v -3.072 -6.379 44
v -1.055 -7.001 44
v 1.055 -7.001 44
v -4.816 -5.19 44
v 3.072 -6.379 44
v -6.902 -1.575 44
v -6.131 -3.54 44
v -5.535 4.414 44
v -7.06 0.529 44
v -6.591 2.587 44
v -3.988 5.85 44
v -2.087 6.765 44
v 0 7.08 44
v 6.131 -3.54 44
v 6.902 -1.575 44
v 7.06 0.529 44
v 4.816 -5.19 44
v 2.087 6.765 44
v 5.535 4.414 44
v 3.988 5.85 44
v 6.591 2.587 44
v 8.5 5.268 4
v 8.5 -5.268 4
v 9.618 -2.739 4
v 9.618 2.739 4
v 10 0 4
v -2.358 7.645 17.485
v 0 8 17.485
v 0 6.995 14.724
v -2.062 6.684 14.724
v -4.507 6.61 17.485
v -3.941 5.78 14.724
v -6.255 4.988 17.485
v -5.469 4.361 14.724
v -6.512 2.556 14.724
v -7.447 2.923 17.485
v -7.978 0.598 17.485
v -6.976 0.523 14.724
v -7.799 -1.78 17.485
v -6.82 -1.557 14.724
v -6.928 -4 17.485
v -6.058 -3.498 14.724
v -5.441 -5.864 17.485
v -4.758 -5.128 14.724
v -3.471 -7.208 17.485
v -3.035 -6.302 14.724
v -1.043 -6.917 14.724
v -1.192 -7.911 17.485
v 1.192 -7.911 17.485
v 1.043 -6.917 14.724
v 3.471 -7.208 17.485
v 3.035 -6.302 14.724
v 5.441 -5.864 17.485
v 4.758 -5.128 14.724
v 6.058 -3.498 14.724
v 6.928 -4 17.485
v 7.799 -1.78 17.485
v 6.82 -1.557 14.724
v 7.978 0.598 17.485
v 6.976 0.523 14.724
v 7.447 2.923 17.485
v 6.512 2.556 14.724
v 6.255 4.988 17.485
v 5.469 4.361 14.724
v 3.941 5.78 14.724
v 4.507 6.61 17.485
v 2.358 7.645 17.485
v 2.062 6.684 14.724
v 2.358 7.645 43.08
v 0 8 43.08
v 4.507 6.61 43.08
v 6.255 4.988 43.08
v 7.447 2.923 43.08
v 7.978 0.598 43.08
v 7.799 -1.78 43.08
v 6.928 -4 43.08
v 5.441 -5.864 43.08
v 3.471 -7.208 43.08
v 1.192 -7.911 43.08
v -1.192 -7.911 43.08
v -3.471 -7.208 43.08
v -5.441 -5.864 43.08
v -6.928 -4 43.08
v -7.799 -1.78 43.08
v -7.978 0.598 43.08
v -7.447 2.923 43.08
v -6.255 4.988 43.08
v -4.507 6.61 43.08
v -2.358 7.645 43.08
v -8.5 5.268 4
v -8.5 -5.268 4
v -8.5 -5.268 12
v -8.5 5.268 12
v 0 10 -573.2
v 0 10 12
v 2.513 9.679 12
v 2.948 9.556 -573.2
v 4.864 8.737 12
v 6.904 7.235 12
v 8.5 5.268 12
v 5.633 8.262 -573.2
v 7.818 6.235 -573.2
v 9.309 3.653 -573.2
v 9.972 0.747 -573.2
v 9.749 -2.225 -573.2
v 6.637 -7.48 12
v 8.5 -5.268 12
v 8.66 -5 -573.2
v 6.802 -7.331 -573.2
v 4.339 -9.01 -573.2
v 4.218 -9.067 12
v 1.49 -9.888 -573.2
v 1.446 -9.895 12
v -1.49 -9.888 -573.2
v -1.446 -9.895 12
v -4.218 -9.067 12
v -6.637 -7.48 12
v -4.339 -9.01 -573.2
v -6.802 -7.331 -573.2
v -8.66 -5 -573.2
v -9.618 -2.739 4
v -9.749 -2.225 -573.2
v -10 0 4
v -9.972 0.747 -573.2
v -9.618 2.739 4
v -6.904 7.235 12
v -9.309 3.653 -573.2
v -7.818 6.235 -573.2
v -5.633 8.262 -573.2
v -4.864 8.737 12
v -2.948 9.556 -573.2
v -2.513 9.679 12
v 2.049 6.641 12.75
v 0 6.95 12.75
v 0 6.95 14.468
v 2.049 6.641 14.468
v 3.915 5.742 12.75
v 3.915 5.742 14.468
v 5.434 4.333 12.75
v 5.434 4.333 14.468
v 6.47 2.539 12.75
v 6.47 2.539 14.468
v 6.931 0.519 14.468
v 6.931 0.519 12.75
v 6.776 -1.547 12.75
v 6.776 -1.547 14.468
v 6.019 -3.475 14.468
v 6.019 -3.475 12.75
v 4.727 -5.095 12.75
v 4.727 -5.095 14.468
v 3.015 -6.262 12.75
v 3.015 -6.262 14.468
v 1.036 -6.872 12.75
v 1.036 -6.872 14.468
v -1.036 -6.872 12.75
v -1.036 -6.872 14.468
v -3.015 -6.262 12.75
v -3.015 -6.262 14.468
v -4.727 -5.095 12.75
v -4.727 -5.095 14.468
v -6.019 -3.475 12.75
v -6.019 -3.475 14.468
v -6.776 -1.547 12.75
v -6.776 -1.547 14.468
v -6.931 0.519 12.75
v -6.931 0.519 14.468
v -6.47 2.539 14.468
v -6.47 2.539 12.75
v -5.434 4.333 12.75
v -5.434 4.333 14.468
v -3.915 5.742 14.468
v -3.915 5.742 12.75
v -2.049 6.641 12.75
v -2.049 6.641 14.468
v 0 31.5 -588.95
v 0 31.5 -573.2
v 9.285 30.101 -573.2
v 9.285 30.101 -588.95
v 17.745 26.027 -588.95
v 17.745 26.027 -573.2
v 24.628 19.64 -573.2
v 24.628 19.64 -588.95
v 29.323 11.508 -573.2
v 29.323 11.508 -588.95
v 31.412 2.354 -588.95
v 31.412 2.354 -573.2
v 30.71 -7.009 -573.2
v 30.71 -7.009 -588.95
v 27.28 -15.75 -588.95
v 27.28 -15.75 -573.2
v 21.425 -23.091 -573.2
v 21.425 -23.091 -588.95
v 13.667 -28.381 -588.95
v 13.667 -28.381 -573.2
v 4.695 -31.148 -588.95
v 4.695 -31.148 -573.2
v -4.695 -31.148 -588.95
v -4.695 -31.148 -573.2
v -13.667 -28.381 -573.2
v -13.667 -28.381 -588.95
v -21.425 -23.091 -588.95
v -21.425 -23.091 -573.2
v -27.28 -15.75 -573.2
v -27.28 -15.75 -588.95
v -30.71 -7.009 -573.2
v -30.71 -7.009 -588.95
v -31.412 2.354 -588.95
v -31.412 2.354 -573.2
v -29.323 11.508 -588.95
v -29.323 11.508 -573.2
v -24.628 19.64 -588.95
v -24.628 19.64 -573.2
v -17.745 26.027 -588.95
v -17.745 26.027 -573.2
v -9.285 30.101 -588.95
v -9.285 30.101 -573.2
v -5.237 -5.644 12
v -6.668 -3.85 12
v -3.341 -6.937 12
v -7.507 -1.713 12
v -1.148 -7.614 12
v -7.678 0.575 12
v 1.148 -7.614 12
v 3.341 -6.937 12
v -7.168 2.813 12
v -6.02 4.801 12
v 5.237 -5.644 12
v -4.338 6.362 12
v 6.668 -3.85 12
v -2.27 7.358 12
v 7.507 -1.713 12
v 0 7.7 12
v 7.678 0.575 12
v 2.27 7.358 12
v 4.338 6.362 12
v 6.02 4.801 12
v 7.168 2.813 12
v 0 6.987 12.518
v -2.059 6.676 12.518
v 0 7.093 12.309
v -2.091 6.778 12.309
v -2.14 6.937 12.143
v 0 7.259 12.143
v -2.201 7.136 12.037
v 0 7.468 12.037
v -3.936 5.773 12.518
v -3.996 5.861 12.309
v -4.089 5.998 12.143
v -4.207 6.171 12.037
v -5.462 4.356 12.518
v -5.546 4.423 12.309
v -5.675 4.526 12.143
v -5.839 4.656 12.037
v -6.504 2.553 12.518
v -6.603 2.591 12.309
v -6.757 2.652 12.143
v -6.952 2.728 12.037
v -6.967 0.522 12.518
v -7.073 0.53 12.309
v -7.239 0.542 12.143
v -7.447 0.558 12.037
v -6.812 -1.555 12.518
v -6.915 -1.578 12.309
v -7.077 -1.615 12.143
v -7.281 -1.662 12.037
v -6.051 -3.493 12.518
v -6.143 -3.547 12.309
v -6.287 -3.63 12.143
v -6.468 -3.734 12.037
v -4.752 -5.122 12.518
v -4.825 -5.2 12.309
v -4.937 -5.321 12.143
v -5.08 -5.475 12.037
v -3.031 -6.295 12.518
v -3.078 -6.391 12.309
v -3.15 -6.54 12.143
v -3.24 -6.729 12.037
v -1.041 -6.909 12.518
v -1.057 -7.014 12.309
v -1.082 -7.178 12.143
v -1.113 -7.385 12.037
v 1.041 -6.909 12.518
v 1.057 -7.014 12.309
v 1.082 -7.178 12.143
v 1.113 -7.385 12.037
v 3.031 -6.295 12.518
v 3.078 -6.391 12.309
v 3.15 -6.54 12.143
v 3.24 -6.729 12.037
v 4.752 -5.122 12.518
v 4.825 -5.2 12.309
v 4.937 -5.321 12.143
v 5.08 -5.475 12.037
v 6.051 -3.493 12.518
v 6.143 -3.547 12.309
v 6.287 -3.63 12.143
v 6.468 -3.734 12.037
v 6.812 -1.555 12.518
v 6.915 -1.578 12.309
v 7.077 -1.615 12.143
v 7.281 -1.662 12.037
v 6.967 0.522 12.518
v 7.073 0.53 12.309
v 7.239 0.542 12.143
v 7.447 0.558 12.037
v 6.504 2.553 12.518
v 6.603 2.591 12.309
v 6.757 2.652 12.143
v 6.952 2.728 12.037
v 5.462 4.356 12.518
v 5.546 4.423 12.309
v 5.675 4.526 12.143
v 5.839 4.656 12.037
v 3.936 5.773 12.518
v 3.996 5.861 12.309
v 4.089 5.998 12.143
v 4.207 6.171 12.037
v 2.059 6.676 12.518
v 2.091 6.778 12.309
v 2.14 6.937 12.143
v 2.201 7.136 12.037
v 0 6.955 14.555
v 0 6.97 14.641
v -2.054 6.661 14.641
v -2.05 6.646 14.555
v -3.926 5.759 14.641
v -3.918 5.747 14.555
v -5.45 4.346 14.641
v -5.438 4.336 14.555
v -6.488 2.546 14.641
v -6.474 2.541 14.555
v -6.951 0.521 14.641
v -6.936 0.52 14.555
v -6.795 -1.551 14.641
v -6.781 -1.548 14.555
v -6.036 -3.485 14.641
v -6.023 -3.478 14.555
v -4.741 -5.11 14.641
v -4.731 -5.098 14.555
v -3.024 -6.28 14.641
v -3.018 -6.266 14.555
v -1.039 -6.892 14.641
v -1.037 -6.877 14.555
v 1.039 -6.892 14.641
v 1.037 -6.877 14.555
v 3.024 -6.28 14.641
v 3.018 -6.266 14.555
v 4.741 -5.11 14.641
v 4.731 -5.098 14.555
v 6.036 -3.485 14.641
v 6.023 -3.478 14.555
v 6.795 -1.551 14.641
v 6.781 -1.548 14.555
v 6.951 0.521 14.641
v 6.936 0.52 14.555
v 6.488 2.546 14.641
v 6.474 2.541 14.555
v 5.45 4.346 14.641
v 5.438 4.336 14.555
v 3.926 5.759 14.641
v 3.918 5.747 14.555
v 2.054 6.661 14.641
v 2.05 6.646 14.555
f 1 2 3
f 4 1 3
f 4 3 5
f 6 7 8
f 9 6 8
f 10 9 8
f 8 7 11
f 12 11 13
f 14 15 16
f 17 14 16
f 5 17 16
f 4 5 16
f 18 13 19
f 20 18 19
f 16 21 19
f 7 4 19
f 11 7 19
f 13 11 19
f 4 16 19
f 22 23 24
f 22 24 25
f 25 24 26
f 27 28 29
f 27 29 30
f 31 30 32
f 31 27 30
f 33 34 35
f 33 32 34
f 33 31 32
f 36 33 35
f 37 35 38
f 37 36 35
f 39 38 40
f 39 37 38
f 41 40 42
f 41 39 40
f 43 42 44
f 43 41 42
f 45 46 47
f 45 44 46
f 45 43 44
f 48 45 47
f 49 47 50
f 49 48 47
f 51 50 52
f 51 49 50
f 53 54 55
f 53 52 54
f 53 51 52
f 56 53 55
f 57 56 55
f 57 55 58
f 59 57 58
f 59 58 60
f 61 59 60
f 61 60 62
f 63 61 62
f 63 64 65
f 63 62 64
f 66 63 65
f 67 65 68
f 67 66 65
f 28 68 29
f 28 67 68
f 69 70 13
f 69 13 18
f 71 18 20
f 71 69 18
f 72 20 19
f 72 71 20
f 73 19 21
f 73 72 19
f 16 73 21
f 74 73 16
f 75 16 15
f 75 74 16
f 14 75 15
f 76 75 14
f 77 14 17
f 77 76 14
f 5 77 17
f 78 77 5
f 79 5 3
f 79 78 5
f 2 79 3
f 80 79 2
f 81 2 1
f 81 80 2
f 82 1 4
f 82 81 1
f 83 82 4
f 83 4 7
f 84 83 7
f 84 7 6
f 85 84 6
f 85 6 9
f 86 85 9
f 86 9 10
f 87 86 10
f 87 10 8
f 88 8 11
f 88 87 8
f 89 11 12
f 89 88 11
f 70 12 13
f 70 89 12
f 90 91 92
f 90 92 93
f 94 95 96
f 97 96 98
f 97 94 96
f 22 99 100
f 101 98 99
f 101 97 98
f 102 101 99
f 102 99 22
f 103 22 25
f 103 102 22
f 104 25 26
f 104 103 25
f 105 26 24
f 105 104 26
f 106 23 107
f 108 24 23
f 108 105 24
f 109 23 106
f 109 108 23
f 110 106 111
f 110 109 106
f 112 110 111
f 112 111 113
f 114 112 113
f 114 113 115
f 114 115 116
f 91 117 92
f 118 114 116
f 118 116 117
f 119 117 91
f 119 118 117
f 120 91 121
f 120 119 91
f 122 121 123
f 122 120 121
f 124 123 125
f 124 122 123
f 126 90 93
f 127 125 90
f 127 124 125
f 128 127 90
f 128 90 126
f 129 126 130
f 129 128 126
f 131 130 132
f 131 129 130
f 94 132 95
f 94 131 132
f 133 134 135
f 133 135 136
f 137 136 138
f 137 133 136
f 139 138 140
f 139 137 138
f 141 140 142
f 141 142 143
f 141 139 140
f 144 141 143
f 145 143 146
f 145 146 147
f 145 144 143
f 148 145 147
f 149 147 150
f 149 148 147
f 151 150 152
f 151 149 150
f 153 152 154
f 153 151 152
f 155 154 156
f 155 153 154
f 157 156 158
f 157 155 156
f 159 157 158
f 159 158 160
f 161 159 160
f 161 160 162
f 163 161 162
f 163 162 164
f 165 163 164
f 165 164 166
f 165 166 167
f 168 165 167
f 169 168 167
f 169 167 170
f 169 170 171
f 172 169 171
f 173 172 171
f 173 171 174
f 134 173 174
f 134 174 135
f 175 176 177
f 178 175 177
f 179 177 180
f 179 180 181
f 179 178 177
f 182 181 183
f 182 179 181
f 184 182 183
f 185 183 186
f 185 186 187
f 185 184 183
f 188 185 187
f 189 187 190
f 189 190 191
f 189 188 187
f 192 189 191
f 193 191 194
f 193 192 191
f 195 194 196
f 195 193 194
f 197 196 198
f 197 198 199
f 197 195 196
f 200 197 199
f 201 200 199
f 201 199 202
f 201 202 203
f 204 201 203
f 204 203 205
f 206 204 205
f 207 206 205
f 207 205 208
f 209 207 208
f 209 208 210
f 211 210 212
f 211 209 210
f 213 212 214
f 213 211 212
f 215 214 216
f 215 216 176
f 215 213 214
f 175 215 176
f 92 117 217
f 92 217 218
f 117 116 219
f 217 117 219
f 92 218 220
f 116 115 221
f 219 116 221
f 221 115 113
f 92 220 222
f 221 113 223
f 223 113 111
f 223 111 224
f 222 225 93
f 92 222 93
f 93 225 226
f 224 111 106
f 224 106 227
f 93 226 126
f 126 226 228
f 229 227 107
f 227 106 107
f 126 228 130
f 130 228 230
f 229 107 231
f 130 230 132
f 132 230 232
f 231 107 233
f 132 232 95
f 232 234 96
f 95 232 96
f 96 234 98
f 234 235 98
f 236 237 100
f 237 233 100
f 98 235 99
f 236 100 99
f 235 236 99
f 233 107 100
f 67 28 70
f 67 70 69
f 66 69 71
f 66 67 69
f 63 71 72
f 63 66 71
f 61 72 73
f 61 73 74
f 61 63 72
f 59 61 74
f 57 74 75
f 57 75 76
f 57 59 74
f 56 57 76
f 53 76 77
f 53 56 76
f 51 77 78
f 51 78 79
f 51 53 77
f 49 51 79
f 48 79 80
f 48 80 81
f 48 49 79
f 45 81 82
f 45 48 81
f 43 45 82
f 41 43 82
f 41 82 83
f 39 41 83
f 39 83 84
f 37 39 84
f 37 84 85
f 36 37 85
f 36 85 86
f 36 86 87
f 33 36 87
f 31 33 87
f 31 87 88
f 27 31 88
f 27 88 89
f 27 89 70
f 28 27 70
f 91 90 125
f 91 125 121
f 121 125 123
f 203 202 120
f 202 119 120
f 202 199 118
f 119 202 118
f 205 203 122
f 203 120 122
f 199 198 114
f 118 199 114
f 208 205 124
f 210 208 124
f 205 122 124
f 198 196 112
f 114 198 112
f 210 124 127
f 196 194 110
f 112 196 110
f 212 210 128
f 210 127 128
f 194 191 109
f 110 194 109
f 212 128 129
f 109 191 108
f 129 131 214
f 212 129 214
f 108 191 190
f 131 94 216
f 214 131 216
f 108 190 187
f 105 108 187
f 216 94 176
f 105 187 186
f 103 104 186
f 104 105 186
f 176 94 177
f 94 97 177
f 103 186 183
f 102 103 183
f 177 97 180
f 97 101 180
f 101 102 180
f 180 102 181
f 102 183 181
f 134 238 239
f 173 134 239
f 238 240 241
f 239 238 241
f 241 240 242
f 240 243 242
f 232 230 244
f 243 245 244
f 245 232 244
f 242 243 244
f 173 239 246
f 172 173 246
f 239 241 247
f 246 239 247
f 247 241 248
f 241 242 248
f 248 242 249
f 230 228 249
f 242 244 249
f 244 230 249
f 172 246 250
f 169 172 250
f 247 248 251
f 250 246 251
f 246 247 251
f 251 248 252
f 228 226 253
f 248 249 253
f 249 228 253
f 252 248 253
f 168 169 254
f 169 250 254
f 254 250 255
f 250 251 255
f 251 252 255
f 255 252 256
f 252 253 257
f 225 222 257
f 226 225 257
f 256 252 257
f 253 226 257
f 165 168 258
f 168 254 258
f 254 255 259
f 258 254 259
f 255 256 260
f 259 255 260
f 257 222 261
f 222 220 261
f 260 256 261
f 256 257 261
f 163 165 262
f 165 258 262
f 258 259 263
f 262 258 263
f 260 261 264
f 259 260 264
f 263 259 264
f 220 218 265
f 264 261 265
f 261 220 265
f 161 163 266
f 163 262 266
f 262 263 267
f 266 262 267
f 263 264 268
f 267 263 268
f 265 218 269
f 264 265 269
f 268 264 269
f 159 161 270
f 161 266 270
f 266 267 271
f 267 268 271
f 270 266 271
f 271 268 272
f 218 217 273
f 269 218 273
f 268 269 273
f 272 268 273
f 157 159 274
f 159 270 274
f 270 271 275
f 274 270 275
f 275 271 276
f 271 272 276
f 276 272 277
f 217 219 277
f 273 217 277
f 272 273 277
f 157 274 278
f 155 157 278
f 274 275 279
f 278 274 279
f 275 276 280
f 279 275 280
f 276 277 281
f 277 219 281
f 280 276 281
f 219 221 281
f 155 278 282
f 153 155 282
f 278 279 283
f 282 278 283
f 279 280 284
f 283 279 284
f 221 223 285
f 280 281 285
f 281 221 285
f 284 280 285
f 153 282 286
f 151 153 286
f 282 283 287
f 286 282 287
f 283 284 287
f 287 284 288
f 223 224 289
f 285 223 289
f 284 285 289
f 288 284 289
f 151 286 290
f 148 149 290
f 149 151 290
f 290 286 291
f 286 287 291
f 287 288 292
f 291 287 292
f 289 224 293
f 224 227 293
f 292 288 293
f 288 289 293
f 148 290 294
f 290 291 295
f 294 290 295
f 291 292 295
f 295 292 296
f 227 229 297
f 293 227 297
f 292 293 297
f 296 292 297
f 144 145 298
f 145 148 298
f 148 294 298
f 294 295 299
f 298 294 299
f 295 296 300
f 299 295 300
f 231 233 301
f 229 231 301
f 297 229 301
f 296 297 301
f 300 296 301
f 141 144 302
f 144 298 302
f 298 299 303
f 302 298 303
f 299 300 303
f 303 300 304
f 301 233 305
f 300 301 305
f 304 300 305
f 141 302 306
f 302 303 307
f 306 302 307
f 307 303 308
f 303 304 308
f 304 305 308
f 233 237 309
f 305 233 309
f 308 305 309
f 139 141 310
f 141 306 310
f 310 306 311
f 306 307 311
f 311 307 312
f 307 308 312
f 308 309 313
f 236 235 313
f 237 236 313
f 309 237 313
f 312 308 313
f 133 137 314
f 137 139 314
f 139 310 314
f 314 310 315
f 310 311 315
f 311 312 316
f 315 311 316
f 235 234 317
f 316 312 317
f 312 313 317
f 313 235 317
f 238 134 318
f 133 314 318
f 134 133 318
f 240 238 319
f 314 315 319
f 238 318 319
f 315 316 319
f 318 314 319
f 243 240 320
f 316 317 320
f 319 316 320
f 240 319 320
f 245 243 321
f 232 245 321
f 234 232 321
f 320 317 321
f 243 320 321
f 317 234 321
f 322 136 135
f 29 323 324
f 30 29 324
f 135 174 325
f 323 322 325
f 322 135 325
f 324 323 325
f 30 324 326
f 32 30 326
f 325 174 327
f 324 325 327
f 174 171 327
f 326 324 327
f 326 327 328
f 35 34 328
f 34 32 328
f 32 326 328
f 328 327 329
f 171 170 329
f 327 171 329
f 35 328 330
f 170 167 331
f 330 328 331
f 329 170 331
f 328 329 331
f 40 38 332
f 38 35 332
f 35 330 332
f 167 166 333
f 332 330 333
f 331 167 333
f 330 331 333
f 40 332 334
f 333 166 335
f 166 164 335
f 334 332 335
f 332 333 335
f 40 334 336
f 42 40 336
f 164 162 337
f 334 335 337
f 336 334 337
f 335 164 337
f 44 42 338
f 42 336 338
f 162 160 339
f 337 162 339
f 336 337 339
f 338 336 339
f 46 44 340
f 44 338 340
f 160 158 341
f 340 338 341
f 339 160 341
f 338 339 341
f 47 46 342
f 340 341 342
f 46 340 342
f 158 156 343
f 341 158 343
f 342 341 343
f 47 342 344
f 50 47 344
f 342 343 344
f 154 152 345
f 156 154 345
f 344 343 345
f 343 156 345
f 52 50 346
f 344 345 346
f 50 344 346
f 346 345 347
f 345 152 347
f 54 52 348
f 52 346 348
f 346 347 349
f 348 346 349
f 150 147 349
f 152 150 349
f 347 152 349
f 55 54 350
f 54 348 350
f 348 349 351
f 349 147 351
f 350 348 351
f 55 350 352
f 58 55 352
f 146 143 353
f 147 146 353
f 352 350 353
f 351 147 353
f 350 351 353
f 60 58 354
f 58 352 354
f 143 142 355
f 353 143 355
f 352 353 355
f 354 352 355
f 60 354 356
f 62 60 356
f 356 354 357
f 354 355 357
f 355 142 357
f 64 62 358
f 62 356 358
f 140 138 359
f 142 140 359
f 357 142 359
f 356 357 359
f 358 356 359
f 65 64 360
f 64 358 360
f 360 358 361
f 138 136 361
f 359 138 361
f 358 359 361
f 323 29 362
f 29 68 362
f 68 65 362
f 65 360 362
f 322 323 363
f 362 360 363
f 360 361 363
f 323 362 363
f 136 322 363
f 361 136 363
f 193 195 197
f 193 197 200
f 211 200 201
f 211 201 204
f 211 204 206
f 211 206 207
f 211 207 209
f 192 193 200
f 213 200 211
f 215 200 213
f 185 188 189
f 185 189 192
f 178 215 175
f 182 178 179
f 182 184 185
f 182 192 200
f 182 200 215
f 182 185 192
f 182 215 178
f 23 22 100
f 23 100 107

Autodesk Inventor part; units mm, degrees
sketch "Sketch_2" plane through (0, 0, 0) normal (1, 0, 0) x (0, 1, 0)
  line L0 (0, -588.95) -> (0, 12)
  line L1 (0, 12) -> (10, 12)
  line L2 (10, 12) -> (10, -573.2)
  line L3 (10, -573.2) -> (31.5, -573.2)
  line L4 (31.5, -573.2) -> (31.5, -588.95)
  line L5 (31.5, -588.95) -> (0, -588.95)
  line L6 (0, -588.95) -> (0, 12)
revolve "Revolution1" add sketch "Sketch_2" angle 360 about axis through (0, 0, -588.95) along (0, 0, -1)
sketch "Sketch_6" plane through (0, 0, 0) normal (1, 0, 0) x (0, 1, 0)
  line L0 (0, 11) -> (0, 44)
  line L1 (0, 44) -> (7.08, 44)
  line L2 (7.08, 44) -> (8, 43.08)
  line L3 (8, 43.08) -> (8, 17.4849)
  line L4 (8, 17.4849) -> (6.9952, 14.7243)
  arc A0 (6.9952, 14.7243) -> (6.95, 14.4678) centre (7.7, 14.4678) ccw
  line L5 (6.95, 14.4678) -> (6.95, 12.75)
  arc A1 (6.95, 12.75) -> (7.7, 12) centre (7.7, 12.75) ccw
  line L6 (7.7, 12) -> (8, 12)
  line L7 (8, 12) -> (8, 11)
  line L8 (8, 11) -> (0, 11)
  line L9 (0, 11) -> (0, 44)
revolve "Revolution2" add sketch "Sketch_6" angle 360 about axis through (0, 0, 11) along (0, 0, -1)
thread "Thread1" size "M16x1.5" class "6g" standard "ISO Metric profile" full length
sketch "Sketch_7" plane through (0, 0, 4) normal (0, 0, 1) x (1, 0, 0)
  line L0 (-17, 34) -> (-17, -17)
  line L1 (-17, -17) -> (-8.5, -17)
  line L2 (-8.5, -17) -> (-8.5, 17)
  line L3 (-8.5, 17) -> (8.5, 17)
  line L4 (8.5, 17) -> (8.5, -17)
  line L5 (8.5, -17) -> (17, -17)
  line L6 (17, -17) -> (17, 34)
  line L7 (17, 34) -> (-17, 34)
extrude "Extrusion1" cut sketch "Sketch_7" along normal blind 9
ref_plane "FDT_KSAUFSATZ_XY" through (0, 0, 26) normal (0, 0, 1) x (-1, 0, 0)
ref_plane "FDT_KSAUFSATZ_YZ" through (0, 0, 26) normal (-1, 0, 0) x (0, -1, 0)
ref_plane "FDT_KSAUFSATZ_ZX" through (0, 0, 26) normal (0, -1, 0) x (0, 0, 1)
ref_plane "FDT_NUT_XY" through (0, 0, 26) normal (0, 0, 1) x (-1, 0, 0)
ref_plane "FDT_NUT_YZ" through (0, 0, 26) normal (-1, 0, 0) x (0, -1, 0)
ref_plane "FDT_NUT_ZX" through (0, 0, 26) normal (0, -1, 0) x (0, 0, 1)
ref_plane "KS_XY" through (0, 0, 0) normal (0, 0, -1) x (1, 0, 0)
ref_plane "KS_YZ" through (0, 0, 0) normal (1, 0, 0) x (0, -1, 0)
ref_plane "KS_ZX" through (0, 0, 0) normal (0, -1, 0) x (0, 0, -1)
ref_plane "NUT1_XY" through (0, 0, 32) normal (0, 0, 1) x (1, 0, 0)
ref_plane "NUT1_YZ" through (0, 0, 32) normal (1, 0, 0) x (0, 1, 0)
ref_plane "NUT1_ZX" through (0, 0, 32) normal (0, 1, 0) x (0, 0, 1)
properties part number "193995 DSNU-63-500-P---(A---00--0-KS)" material "Aluminum 6061"
